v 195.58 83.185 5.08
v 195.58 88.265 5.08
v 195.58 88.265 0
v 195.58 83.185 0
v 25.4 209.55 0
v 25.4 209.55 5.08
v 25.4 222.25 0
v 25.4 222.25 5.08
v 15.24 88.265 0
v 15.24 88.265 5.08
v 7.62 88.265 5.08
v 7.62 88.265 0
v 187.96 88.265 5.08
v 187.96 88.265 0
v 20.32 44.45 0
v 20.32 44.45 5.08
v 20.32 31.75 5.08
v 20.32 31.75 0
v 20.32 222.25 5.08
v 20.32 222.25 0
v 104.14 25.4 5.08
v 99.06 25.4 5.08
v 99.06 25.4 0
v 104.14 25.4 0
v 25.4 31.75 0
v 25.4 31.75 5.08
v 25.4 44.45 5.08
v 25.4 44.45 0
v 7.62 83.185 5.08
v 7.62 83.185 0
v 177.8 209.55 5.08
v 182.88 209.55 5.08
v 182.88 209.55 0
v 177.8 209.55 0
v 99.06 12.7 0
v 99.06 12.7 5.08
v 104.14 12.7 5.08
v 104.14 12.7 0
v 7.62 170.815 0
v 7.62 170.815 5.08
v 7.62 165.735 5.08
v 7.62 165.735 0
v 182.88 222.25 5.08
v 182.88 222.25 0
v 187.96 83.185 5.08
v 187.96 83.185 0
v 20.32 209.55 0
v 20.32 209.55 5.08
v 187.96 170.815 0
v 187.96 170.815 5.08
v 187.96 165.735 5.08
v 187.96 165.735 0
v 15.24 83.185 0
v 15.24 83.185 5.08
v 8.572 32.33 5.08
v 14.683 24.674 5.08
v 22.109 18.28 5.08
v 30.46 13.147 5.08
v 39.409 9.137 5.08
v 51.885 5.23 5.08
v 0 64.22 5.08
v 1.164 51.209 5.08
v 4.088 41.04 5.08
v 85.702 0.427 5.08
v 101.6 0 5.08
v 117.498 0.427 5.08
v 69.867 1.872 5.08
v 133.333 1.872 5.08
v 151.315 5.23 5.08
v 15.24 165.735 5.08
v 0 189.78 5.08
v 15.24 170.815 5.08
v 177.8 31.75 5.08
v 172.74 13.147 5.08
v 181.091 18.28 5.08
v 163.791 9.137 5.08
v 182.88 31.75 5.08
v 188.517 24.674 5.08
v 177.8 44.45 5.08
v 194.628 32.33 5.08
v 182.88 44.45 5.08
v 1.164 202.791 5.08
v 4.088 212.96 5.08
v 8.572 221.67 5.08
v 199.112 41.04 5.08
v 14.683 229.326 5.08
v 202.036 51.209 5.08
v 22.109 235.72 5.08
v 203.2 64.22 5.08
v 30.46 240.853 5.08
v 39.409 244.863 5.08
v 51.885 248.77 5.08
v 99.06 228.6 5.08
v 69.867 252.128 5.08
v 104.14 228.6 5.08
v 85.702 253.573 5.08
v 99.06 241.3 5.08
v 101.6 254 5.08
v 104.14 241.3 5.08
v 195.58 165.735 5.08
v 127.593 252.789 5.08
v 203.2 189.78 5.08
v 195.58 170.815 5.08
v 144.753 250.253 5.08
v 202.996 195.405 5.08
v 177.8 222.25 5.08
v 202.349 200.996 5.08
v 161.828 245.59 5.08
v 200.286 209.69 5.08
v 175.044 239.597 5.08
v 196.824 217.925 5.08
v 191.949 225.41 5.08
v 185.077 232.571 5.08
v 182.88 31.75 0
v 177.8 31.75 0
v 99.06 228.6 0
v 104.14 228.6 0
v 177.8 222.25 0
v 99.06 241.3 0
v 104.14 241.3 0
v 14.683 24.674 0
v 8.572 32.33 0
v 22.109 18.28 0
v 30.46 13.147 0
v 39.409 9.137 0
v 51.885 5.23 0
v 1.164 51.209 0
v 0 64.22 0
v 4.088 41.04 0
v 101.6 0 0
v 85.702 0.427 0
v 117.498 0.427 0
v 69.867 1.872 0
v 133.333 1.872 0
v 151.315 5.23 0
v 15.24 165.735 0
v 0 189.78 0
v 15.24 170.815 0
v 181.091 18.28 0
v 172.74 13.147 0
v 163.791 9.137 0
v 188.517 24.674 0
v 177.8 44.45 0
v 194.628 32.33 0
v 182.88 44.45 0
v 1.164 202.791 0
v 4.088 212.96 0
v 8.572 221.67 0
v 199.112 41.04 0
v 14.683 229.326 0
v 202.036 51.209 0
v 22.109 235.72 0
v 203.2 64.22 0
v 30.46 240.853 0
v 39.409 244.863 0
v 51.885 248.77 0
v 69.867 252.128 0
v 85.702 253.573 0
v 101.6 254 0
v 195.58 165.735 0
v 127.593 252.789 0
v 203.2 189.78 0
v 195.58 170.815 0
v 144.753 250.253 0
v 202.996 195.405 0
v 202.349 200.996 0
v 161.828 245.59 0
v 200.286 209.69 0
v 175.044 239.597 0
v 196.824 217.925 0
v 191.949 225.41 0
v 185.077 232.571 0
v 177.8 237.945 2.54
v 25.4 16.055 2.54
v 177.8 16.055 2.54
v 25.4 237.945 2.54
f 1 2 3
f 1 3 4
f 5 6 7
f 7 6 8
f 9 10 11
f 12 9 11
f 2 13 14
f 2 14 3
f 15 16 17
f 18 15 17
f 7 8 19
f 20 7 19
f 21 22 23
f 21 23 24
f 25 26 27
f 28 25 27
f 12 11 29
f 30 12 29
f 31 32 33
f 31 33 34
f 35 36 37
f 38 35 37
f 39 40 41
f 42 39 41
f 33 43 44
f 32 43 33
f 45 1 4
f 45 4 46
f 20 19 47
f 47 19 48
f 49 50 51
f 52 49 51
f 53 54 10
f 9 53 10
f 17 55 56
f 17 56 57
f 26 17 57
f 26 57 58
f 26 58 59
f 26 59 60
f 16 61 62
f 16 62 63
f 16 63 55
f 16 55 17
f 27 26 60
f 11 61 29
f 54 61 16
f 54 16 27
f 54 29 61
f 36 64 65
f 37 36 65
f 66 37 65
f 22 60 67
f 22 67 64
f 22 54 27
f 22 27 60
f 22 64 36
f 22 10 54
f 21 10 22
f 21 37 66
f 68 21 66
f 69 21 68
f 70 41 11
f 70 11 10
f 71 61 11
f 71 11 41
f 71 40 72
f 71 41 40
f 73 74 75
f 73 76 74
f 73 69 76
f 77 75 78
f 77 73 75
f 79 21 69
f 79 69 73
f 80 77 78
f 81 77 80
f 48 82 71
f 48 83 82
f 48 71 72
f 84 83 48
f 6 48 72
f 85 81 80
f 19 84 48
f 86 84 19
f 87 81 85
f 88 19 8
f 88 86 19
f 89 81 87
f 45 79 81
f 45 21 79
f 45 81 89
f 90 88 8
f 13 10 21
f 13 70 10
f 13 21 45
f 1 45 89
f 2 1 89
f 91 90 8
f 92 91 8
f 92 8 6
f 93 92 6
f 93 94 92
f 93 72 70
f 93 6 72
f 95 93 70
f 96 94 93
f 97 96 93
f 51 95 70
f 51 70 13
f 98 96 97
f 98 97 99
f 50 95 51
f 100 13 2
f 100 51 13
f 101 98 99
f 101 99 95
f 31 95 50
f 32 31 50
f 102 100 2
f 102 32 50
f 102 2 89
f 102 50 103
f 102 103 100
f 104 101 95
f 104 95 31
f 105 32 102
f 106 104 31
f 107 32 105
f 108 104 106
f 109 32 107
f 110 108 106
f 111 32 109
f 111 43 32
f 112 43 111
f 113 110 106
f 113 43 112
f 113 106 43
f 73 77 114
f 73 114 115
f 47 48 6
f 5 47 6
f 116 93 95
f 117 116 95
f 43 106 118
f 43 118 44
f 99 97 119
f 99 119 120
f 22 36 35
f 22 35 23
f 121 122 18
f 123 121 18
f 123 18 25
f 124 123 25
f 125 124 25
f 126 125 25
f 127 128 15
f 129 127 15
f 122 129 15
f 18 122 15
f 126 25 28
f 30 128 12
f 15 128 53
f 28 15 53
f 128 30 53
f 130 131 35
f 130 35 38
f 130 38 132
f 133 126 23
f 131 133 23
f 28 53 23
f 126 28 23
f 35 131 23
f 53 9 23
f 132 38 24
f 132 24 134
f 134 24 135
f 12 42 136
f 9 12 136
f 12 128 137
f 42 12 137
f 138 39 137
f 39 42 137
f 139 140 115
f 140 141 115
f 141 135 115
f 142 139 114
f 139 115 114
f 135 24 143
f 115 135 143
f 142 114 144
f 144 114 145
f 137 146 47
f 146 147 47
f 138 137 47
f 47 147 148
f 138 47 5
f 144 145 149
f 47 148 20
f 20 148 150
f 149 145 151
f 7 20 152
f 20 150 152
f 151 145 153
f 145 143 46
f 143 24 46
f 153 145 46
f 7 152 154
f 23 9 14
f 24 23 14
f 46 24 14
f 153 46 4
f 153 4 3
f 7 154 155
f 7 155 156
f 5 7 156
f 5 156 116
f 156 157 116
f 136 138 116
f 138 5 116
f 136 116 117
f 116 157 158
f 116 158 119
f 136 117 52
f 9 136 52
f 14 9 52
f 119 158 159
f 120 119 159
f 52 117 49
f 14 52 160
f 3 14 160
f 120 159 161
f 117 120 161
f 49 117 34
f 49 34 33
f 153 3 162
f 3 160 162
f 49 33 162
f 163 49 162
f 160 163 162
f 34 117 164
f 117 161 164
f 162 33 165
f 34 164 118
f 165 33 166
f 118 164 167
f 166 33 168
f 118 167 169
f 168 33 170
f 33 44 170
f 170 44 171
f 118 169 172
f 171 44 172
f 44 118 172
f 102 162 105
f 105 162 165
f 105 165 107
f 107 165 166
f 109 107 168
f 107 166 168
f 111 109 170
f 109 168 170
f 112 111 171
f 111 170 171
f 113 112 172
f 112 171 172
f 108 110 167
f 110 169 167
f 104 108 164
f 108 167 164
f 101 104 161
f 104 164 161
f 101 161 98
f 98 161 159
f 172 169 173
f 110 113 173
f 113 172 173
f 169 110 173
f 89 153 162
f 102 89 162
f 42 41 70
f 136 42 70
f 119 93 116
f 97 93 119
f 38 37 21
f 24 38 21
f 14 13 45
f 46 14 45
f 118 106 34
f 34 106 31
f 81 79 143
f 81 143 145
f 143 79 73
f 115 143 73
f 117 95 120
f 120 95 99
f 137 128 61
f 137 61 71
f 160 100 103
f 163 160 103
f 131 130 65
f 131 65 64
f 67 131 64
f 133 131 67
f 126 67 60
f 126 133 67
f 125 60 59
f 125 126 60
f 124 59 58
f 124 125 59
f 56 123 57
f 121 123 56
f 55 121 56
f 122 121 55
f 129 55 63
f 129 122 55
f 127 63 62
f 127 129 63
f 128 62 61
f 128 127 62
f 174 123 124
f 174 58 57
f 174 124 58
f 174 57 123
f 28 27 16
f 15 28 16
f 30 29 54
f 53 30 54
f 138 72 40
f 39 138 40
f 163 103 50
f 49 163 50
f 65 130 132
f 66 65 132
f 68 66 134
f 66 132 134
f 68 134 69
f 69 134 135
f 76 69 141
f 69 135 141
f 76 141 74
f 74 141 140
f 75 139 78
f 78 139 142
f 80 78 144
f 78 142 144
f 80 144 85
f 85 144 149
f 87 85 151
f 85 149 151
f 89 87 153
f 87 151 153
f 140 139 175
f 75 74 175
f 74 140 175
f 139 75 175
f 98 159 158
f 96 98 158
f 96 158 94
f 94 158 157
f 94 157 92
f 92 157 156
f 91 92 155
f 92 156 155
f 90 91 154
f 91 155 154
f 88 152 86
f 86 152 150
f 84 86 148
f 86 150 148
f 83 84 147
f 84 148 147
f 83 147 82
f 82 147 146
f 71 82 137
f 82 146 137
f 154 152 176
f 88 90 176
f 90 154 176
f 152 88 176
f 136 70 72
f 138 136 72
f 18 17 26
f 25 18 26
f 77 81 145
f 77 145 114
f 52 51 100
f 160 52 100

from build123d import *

# Parameters (mm, degrees)
SKETCH1_W           = 203.2
SKETCH1_H           = 254
BOSS_EXTRUDE1_DEPTH = 5.08
FILLET1_SIZE        = 64.219666667
FILLET1_SIZE_2      = 101.6
SKETCH14_W          = 5.08
SKETCH14_H          = 12.7
CUT_EXTRUDE2_DEPTH  = 326.318377121
CUT_EXTRUDE3_DEPTH  = 326.318377121


with BuildPart() as part:
    # Sketch1 → Boss-Extrude1 (new body)
    with BuildSketch(Plane.XY):
        with Locations((101.6, 127)):
            Rectangle(SKETCH1_W, SKETCH1_H)
    extrude(amount=BOSS_EXTRUDE1_DEPTH)

    # Fillet1
    # a fillet whose section is not a circle: 101.6, 64.219666667 mm, written as the material it takes off along each edge
    with BuildSketch(Plane(origin=(203.2, 254, -254), x_dir=(0, -1, 0), z_dir=(0, 0, 1))) as fillet1_piece_1:
        with BuildLine():
            Bezier((FILLET1_SIZE, 0), (0, 0), (0, -FILLET1_SIZE_2), weights=[1, 1, 1])
            Line((0, -FILLET1_SIZE_2), (0, 0))
            Line((0, 0), (FILLET1_SIZE, 0))
        make_face()
    extrude(amount=513.08, mode=Mode.SUBTRACT)
    with BuildSketch(Plane(origin=(0, 254, -254), x_dir=(1, 0, 0), z_dir=(0, 0, 1)), Plane(origin=(203.2, 0, -254), x_dir=(-1, 0, 0), z_dir=(0, 0, 1))) as fillet1_piece_2:
        with BuildLine():
            Bezier((FILLET1_SIZE_2, 0), (0, 0), (0, -FILLET1_SIZE), weights=[1, 1, 1])
            Line((0, -FILLET1_SIZE), (0, 0))
            Line((0, 0), (FILLET1_SIZE_2, 0))
        make_face()
    extrude(amount=513.08, mode=Mode.SUBTRACT)
    with BuildSketch(Plane(origin=(0, 0, -254), x_dir=(1, 0, 0), z_dir=(0, 0, 1))) as fillet1_piece_3:
        with BuildLine():
            Bezier((FILLET1_SIZE_2, 0), (0, 0), (0, FILLET1_SIZE), weights=[1, 1, 1])
            Line((0, FILLET1_SIZE), (0, 0))
            Line((0, 0), (FILLET1_SIZE_2, 0))
        make_face()
    extrude(amount=513.08, mode=Mode.SUBTRACT)

    # Sketch14 → Cut-Extrude2 (cut, through all)
    with BuildSketch(Plane.XY.offset(5.08)):
        with Locations((101.6, 234.95)):
            Rectangle(SKETCH14_W, SKETCH14_H)
        with Locations((101.6, 19.05)):
            Rectangle(SKETCH14_W, SKETCH14_H)
    extrude(amount=-CUT_EXTRUDE2_DEPTH, mode=Mode.SUBTRACT)

    # Sketch13 → Cut-Extrude3 (cut, through all)
    with BuildSketch(Plane.XY.offset(5.08)):
        Polygon((25.4, 222.25), (20.32, 222.25), (20.32, 209.55), (25.4, 209.55), (25.4, 215.9), align=None)
        Polygon((177.8, 215.9), (177.8, 222.25), (182.88, 222.25), (182.88, 209.55), (177.8, 209.55), align=None)
        Polygon((177.8, 38.1), (177.8, 44.45), (182.88, 44.45), (182.88, 31.75), (177.8, 31.75), align=None)
        Polygon((25.4, 38.1), (25.4, 44.45), (20.32, 44.45), (20.32, 31.75), (25.4, 31.75), align=None)
        Polygon((187.96, 168.275), (187.96, 165.735), (195.58, 165.735), (195.58, 170.815), (187.96, 170.815), align=None)
        Polygon((187.96, 85.725), (187.96, 88.265), (195.58, 88.265), (195.58, 83.185), (187.96, 83.185), align=None)
        Polygon((15.24, 168.275), (15.24, 170.815), (7.62, 170.815), (7.62, 165.735), (15.24, 165.735), align=None)
        Polygon((15.24, 85.725), (15.24, 88.265), (7.62, 88.265), (7.62, 83.185), (15.24, 83.185), align=None)
    extrude(amount=-CUT_EXTRUDE3_DEPTH, mode=Mode.SUBTRACT)


solid = part.part
